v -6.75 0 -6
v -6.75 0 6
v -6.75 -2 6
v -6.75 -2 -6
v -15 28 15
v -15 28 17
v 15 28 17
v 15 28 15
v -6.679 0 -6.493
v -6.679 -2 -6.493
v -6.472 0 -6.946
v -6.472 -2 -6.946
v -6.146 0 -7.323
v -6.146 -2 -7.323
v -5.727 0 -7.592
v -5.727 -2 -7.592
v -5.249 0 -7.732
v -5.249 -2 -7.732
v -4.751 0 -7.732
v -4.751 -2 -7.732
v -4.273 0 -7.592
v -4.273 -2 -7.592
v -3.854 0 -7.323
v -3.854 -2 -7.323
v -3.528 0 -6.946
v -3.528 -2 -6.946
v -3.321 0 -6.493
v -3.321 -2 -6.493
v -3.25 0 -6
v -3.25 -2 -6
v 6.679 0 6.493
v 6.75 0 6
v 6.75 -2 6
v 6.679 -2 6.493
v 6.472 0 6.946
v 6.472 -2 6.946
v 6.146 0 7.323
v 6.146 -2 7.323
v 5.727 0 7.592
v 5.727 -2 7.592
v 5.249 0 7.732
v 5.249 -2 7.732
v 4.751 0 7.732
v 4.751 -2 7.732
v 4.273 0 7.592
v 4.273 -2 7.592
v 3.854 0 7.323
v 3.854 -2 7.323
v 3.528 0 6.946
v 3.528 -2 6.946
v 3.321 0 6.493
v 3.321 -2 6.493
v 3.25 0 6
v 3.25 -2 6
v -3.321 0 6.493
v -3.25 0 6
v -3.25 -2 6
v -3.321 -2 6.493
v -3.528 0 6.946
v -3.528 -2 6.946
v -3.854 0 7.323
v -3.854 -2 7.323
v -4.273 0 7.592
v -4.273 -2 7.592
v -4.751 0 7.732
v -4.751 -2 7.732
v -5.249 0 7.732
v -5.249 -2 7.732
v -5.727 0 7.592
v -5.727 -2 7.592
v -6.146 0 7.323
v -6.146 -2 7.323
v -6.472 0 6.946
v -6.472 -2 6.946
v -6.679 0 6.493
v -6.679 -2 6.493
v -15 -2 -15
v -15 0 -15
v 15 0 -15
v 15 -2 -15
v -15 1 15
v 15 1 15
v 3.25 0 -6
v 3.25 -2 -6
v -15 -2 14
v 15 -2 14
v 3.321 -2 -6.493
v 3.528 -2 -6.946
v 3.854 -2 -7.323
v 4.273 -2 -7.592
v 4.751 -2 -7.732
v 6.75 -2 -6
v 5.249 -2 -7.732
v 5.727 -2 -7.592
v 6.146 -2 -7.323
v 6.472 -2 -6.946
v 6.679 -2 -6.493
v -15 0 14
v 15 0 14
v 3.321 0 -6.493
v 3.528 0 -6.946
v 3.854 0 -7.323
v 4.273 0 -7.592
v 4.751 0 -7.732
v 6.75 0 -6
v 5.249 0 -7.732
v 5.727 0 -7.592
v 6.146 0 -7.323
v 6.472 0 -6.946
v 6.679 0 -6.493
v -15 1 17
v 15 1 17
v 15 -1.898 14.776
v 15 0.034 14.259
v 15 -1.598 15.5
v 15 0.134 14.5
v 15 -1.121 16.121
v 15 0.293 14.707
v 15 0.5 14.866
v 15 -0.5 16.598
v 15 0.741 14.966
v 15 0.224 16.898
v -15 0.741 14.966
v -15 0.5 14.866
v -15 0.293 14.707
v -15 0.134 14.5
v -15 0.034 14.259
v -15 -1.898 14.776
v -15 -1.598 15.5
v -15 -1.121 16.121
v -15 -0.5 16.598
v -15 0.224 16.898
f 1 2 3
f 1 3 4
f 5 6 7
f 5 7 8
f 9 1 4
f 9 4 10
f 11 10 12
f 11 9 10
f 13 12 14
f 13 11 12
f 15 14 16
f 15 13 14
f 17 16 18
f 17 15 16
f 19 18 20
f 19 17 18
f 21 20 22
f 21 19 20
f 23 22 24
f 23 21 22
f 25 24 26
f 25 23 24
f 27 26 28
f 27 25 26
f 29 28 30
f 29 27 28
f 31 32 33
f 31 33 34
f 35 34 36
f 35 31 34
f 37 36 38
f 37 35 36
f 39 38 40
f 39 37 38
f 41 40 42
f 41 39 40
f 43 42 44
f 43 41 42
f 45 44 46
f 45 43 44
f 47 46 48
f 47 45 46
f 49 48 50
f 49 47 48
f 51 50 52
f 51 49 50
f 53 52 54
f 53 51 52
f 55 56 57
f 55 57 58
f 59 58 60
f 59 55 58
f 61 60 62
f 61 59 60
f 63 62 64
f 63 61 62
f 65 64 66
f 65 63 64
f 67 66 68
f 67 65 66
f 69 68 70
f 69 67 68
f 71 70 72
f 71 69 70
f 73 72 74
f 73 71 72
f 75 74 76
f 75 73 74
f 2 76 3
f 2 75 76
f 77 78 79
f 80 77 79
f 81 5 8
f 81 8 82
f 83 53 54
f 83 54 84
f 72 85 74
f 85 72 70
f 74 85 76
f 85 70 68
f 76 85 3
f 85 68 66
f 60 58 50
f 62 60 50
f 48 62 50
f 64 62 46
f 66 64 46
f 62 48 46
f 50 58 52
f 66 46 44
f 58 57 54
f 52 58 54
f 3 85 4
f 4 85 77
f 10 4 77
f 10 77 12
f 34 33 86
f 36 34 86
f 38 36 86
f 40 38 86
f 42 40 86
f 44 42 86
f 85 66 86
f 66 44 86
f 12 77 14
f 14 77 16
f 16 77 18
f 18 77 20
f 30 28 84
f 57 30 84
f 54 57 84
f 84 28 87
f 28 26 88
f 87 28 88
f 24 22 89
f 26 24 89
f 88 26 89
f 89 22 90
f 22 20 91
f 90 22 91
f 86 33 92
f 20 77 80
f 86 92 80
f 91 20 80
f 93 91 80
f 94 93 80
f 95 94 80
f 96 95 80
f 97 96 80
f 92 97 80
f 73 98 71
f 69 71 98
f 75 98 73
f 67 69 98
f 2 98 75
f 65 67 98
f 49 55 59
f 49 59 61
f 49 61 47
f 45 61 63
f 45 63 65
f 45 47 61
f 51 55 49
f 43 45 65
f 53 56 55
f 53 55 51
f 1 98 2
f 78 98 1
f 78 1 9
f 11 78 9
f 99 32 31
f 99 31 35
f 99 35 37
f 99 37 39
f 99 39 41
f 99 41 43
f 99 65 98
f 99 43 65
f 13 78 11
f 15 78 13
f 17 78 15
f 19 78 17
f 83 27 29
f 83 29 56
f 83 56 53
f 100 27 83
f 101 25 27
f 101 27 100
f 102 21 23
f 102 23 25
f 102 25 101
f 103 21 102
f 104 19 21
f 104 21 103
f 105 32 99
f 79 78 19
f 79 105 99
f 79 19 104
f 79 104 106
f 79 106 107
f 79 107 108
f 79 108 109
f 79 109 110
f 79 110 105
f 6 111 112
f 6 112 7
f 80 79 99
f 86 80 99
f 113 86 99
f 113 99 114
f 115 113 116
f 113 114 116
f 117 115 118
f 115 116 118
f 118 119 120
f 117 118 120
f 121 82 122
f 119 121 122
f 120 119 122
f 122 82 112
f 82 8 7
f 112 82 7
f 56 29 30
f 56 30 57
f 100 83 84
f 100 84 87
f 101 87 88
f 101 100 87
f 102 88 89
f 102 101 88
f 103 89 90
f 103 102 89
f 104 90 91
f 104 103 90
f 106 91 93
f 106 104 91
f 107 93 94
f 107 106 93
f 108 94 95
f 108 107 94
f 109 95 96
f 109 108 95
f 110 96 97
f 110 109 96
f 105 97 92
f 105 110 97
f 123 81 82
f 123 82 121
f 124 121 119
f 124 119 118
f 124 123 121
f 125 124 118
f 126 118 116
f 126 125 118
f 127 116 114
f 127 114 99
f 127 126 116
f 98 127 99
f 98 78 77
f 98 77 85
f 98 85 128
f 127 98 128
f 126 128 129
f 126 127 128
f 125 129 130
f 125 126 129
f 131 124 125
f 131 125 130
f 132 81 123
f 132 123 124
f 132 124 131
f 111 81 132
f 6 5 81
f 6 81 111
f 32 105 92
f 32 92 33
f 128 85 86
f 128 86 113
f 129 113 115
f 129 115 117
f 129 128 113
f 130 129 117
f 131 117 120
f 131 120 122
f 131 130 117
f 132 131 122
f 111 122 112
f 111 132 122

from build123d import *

# Parameters (mm, degrees)
SKETCH1_W                    = 30
SKETCH1_H                    = 30
BASE_FLANGE1_DEPTH           = 2
EDGE_FLANGE1_STRIP_W         = 10
EDGE_FLANGE1_STRIP_H         = 2
EDGE_FLANGE1_STRIP_CUT_DEPTH = 30
EDGE_FLANGE1_DEPTH           = 30


# Sheet-metal steps are written as plain solids
with BuildPart() as part:
    # Sketch1 → Base-Flange1 (new body)
    with BuildSketch(Plane(origin=(0, 0, 0), x_dir=(1, 0, 0), z_dir=(0, 1, 0))):
        Rectangle(SKETCH1_W, SKETCH1_H)
        with BuildLine():
            Line((-6.75, -6), (-6.75, 6))
            ThreePointArc((-6.75, 6), (-5, 7.75), (-3.25, 6))
            Line((-3.25, 6), (-3.25, -6))
            ThreePointArc((-3.25, -6), (-5, -7.75), (-6.75, -6))
        make_face(mode=Mode.SUBTRACT)
        with BuildLine():
            Line((3.25, -6), (3.25, 6))
            ThreePointArc((3.25, 6), (5, 7.75), (6.75, 6))
            Line((6.75, 6), (6.75, -6))
            ThreePointArc((6.75, -6), (5, -7.75), (3.25, -6))
        make_face(mode=Mode.SUBTRACT)
    extrude(amount=-BASE_FLANGE1_DEPTH)

    # Edge-Flange1 strip (across the edge) → Edge-Flange1 strip cut (cut)
    with BuildSketch(Plane(origin=(-15, 0, 15), x_dir=(0, 0, -1), z_dir=(1, 0, 0))):
        with Locations((-4, -1)):
            Rectangle(EDGE_FLANGE1_STRIP_W, EDGE_FLANGE1_STRIP_H)
    extrude(amount=EDGE_FLANGE1_STRIP_CUT_DEPTH, mode=Mode.SUBTRACT)

    # Edge-Flange1 section (across the edge) → Edge-Flange1 (add)
    with BuildSketch(Plane(origin=(-15, 0, 15), x_dir=(0, 0, -1), z_dir=(1, 0, 0))):
        with BuildLine():
            Line((-2, 1), (-2, 28))
            Line((-2, 28), (0, 28))
            Line((0, 28), (0, 1))
            ThreePointArc((0, 1), (0.292893219, 0.292893219), (1, 0))
            Line((1, 0), (1, -2))
            ThreePointArc((1, -2), (-1.121320344, -1.121320344), (-2, 1))
        make_face()
    extrude(amount=EDGE_FLANGE1_DEPTH)


solid = part.part
